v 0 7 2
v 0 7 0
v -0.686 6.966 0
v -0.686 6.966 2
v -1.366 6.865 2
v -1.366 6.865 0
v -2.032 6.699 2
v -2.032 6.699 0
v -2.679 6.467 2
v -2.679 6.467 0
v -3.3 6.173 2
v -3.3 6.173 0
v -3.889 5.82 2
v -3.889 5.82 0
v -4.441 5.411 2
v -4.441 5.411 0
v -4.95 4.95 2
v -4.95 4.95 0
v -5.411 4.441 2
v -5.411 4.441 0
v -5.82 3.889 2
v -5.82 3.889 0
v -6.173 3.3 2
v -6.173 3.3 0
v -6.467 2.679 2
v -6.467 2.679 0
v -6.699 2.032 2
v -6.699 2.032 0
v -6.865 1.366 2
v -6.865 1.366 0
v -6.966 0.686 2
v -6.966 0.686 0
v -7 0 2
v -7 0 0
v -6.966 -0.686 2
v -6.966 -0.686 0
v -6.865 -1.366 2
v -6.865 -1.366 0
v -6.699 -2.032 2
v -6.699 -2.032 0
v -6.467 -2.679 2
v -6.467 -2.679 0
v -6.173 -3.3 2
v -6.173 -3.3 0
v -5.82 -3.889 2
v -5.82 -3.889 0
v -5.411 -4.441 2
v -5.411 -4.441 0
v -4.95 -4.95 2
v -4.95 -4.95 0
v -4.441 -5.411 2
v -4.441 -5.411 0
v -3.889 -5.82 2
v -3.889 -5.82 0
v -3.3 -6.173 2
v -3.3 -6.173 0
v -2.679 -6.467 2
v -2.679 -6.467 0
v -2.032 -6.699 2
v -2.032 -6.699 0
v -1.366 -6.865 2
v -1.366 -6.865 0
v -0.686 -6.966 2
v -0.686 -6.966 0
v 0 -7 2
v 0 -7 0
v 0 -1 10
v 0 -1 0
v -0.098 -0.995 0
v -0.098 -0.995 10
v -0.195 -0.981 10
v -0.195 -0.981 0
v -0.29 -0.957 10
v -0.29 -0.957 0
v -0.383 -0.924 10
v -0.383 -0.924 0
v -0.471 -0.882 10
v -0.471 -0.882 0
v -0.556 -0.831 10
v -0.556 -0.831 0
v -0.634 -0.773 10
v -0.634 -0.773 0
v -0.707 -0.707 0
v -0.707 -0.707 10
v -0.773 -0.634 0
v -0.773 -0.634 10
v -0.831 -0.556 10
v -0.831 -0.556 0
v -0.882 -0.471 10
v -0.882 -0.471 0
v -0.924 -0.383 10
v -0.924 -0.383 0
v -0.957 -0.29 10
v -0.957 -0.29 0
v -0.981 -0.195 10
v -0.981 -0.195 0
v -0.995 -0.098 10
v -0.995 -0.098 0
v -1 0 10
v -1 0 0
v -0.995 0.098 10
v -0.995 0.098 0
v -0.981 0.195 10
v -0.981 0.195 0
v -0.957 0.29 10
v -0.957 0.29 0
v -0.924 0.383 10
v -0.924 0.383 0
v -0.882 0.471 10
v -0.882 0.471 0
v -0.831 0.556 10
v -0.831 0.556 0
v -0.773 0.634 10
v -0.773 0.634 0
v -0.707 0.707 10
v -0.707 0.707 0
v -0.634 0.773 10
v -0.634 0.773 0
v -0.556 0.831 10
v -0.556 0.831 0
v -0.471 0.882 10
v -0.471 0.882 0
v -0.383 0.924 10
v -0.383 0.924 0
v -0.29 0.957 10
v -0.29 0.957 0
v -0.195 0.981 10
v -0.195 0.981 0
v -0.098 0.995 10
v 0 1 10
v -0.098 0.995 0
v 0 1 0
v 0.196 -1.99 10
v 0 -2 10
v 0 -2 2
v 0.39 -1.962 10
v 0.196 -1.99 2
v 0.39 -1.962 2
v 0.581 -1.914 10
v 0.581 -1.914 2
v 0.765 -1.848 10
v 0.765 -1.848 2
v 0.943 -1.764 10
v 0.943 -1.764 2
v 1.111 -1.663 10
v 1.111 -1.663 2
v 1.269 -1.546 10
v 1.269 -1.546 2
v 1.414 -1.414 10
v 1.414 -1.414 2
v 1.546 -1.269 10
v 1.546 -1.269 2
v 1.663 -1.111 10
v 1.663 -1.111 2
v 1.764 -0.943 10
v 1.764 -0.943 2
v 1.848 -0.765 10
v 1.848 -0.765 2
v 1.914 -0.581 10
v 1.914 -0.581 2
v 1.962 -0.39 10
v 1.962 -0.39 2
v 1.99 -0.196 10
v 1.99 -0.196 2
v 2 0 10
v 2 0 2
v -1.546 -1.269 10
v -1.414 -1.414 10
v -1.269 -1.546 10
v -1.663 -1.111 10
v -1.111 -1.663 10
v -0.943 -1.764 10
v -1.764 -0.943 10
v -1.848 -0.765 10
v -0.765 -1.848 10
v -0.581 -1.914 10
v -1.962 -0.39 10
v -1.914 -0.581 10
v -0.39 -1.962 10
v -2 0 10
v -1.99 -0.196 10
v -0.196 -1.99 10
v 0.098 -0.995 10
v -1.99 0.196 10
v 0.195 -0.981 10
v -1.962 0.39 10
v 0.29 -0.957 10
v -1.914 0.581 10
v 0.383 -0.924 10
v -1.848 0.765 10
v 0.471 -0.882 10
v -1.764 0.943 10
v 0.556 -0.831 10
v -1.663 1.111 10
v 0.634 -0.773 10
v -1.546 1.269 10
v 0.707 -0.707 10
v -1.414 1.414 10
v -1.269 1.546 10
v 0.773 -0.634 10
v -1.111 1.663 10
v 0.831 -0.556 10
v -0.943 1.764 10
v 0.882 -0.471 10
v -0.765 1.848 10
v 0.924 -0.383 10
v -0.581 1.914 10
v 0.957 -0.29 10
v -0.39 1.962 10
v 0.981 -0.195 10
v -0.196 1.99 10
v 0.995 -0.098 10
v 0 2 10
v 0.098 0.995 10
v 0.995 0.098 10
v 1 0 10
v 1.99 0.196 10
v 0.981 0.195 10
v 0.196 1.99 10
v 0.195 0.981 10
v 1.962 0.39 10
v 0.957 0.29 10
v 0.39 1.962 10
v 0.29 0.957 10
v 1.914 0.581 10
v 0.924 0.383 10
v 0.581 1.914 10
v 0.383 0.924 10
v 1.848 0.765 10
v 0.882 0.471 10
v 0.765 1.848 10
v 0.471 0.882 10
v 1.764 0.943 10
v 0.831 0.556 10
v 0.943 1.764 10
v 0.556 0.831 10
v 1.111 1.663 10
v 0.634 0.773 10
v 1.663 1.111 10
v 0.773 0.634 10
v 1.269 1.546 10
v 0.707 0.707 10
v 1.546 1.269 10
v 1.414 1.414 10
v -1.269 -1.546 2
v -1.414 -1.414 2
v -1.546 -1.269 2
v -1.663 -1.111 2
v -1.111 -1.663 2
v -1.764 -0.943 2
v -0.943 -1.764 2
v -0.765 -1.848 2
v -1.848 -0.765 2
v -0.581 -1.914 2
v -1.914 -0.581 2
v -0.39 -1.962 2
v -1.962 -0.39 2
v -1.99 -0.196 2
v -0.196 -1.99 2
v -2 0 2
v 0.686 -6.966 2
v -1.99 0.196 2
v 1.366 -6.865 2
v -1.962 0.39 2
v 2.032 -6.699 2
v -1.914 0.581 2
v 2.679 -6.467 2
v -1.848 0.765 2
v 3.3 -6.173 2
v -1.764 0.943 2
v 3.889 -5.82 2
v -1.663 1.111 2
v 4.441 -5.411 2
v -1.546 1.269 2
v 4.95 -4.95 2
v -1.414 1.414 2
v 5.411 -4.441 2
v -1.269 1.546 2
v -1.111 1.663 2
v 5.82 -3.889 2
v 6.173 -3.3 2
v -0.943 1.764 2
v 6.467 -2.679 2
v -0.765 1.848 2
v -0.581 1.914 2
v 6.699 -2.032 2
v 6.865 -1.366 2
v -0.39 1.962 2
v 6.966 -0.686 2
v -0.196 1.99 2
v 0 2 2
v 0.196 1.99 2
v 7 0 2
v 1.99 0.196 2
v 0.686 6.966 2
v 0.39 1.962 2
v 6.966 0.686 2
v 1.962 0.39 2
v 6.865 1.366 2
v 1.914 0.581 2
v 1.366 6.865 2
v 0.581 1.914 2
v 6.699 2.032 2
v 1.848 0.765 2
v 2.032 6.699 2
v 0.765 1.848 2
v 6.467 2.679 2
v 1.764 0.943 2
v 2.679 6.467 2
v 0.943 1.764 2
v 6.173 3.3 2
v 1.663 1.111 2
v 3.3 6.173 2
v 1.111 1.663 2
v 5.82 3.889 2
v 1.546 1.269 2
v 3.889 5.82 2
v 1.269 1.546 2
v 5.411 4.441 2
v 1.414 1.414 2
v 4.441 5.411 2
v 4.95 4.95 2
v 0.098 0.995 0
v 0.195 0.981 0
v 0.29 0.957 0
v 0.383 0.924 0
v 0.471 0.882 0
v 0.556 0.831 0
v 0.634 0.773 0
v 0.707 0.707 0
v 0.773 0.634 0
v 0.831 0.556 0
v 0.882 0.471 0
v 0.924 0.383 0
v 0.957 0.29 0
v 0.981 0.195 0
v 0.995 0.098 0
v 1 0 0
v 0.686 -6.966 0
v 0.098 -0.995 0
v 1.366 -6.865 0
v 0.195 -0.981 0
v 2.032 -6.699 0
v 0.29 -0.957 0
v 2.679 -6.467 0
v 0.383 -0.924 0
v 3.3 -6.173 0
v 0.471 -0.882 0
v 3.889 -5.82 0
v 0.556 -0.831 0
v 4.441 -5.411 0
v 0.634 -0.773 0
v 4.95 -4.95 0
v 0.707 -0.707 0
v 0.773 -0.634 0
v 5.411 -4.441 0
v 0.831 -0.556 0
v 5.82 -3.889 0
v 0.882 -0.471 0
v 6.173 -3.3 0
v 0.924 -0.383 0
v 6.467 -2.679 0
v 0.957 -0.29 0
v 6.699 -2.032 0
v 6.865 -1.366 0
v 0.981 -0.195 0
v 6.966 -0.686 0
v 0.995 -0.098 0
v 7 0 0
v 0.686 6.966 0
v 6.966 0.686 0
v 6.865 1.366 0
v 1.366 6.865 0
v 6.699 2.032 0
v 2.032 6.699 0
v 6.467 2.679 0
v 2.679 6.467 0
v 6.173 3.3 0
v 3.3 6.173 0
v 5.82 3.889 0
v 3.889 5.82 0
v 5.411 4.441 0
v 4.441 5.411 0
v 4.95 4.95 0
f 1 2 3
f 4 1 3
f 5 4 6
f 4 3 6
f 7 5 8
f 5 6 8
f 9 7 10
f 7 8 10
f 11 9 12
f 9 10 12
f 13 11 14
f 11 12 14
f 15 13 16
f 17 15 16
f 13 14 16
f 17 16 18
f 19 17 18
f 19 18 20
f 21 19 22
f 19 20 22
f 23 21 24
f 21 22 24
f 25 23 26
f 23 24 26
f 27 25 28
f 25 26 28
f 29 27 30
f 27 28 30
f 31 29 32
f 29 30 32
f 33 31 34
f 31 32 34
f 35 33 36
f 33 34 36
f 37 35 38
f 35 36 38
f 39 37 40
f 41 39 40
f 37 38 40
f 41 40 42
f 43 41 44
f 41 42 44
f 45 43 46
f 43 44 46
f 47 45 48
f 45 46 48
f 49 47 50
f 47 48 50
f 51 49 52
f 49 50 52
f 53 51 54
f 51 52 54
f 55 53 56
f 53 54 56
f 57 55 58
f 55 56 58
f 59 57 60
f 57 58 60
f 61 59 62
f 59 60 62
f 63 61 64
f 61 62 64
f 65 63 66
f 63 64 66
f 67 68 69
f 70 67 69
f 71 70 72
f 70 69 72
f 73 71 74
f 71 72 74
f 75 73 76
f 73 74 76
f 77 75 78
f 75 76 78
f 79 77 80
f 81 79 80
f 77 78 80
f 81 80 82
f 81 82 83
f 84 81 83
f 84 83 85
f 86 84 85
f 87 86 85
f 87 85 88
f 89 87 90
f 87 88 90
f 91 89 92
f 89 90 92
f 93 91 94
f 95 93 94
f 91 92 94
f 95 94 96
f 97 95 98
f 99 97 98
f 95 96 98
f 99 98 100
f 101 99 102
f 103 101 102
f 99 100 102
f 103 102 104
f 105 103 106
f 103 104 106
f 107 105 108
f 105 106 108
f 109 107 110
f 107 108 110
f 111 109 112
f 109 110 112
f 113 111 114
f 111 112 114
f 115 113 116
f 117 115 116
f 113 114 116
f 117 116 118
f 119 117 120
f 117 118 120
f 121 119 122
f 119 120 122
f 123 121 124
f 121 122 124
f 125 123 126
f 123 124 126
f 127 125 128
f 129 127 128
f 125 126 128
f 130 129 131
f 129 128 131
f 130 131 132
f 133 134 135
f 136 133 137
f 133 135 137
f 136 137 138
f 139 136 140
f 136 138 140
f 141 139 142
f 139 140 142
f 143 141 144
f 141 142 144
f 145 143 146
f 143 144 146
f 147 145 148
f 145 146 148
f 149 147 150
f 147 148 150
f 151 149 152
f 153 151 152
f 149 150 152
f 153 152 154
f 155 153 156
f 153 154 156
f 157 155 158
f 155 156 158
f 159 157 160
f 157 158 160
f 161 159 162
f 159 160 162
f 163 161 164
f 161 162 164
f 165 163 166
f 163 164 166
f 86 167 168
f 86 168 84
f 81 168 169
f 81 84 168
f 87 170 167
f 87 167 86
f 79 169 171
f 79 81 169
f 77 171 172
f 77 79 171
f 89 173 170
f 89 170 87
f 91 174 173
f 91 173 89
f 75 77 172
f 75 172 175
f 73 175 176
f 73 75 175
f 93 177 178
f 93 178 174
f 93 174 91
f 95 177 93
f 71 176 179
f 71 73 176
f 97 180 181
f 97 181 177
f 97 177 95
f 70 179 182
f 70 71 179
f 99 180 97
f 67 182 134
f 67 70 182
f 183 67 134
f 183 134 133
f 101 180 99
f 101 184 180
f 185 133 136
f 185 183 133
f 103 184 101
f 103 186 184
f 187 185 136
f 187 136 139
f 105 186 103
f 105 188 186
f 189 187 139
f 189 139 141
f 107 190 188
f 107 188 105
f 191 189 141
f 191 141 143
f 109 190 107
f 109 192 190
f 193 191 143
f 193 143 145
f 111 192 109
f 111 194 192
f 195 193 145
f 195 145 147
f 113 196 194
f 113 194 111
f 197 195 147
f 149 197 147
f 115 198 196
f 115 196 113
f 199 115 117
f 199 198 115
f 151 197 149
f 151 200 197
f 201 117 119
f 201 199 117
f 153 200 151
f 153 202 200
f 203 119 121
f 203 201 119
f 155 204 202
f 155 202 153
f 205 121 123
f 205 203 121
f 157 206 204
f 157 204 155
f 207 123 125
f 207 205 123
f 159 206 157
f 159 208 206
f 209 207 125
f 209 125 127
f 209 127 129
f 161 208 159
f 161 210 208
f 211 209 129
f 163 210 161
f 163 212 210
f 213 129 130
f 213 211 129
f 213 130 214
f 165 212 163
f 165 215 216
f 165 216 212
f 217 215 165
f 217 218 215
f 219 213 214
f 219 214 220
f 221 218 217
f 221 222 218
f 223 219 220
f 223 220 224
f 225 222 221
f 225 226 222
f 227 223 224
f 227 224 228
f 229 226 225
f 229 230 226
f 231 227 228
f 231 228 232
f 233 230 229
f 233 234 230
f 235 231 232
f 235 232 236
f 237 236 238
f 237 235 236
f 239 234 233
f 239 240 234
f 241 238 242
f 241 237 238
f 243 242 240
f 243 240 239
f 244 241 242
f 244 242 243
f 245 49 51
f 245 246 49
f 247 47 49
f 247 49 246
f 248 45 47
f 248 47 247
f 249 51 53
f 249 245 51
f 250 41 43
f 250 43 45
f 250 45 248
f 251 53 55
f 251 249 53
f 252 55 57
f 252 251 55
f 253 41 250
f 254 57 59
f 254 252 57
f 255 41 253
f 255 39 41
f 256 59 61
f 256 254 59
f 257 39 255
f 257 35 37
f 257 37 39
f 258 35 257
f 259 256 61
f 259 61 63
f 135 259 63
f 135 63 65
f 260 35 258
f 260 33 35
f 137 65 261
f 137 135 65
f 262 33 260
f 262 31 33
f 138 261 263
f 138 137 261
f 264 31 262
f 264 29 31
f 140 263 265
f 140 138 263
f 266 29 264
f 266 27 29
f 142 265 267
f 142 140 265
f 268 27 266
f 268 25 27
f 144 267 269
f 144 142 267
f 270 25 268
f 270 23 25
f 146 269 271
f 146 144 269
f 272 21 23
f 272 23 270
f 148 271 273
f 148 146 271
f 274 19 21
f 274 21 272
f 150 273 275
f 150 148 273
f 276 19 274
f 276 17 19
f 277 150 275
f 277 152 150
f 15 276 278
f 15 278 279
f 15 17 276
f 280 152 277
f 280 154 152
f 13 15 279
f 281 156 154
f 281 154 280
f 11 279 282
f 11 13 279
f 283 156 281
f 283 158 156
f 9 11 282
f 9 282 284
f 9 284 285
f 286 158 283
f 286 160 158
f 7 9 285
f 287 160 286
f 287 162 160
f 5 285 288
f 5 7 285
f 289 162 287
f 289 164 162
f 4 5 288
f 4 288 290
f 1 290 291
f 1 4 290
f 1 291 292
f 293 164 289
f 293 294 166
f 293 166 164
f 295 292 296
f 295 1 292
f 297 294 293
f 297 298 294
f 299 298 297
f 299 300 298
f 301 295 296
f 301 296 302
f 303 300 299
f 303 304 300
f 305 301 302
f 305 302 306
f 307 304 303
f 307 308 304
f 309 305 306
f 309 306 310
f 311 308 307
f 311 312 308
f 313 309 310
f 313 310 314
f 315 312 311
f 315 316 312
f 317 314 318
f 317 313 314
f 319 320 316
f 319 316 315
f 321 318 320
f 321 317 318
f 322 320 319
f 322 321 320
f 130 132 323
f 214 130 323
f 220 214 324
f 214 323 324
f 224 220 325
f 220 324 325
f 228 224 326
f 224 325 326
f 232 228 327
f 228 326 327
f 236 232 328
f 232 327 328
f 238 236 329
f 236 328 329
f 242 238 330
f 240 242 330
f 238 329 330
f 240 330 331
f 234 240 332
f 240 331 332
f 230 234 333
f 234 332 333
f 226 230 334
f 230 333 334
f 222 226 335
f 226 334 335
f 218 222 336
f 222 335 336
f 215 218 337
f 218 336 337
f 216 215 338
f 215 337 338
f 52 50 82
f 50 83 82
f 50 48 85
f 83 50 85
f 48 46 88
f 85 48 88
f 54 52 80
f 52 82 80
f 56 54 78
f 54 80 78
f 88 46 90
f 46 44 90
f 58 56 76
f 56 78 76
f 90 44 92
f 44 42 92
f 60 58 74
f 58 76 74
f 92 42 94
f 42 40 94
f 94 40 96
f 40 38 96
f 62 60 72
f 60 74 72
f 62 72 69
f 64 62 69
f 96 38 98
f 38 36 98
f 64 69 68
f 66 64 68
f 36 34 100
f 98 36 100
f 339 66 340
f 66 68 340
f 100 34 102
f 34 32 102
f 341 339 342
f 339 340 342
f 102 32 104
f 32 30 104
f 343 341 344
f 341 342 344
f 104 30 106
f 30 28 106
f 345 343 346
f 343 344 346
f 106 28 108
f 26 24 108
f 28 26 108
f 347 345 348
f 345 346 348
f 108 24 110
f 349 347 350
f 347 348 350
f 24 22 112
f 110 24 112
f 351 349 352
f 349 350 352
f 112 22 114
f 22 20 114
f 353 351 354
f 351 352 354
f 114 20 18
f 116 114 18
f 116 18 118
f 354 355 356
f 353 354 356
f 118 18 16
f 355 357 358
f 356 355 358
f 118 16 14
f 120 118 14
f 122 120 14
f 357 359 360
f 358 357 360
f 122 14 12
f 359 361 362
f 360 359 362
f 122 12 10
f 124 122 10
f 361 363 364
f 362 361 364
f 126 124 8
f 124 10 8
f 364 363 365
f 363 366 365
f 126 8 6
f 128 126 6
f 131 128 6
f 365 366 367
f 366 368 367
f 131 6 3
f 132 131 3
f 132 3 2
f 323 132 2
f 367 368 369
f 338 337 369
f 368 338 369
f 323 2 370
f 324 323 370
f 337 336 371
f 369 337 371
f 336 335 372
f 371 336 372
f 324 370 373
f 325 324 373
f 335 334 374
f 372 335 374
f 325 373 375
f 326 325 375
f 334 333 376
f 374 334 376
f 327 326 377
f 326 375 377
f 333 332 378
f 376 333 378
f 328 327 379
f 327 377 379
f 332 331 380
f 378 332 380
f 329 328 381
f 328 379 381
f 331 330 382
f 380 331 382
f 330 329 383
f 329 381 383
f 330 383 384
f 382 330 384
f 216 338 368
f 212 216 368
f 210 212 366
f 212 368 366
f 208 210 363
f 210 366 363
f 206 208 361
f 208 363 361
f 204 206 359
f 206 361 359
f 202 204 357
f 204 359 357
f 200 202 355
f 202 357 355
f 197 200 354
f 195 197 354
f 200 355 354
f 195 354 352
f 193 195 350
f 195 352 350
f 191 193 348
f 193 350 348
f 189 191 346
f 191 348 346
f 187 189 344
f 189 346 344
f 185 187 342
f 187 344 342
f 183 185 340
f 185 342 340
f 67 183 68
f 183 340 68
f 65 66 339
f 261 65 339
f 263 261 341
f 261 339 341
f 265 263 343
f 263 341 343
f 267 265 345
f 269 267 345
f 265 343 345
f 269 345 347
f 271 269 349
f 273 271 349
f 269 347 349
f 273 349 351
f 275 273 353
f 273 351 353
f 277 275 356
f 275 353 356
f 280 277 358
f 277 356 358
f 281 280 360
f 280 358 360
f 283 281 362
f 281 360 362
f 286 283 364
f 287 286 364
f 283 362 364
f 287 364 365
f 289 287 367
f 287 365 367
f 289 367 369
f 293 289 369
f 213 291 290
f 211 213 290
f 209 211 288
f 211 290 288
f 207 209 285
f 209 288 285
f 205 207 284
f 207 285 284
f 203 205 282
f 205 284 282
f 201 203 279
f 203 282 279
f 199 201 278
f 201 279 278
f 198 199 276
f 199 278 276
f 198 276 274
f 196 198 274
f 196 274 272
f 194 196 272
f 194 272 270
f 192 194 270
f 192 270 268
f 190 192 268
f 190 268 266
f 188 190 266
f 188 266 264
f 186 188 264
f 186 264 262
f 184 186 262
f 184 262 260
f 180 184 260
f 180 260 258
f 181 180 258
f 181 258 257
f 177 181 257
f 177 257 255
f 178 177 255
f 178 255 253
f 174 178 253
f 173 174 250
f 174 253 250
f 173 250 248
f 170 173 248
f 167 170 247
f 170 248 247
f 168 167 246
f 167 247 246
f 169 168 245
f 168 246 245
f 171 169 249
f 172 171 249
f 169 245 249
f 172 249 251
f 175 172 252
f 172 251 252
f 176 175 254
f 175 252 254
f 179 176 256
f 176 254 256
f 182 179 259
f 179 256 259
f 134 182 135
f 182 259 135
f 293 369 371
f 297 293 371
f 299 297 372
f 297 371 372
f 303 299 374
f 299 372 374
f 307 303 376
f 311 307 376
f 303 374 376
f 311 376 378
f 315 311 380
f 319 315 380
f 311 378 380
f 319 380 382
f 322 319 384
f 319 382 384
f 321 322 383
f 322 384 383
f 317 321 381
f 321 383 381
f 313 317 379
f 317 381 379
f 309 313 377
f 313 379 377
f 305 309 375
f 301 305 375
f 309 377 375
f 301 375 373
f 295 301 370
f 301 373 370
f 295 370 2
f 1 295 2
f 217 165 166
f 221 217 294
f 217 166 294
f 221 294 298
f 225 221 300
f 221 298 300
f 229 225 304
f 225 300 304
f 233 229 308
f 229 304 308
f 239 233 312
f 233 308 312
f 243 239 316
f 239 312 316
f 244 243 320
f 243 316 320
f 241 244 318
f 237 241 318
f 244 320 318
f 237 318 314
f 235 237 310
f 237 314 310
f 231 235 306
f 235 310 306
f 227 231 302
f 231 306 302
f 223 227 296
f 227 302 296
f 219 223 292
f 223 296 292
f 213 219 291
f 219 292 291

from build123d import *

# Parameters (mm, degrees)
F1_DEPTH = 2
F2_DEPTH = 2
F3_DEPTH = 10


with BuildPart() as f1:
    # F0 (on Top) → F1 (new body)
    with BuildSketch(Plane.XY):
        with BuildLine():
            Line((0, 2), (0, 7))
            ThreePointArc((0, 7), (-7, 0), (0, -7))
            Line((0, -7), (0, -2))
            ThreePointArc((0, -2), (-2, 0), (0, 2))
        make_face()
    extrude(amount=F1_DEPTH)



with BuildPart() as f2:
    # F0 (on Top) → F2 (new body)
    with BuildSketch(Plane.XY):
        with BuildLine():
            ThreePointArc((0, -7), (4.949747, -4.949747), (7, 0))
            ThreePointArc((7, 0), (4.949747, 4.949747), (0, 7))
            Line((0, 7), (0, 2))
            ThreePointArc((0, 2), (1.414214, 1.414214), (2, 0))
            ThreePointArc((2, 0), (1.414214, -1.414214), (0, -2))
            Line((0, -2), (0, -7))
        make_face()
    extrude(amount=F2_DEPTH)


with BuildPart() as f1_1:
    add(f1.part)

    add(f2.part)  # F3 merges F2
    # F0 (on Top) → F3 (join)
    with BuildSketch(Plane.XY):
        with BuildLine():
            ThreePointArc((2, 0), (1.414214, 1.414214), (0, 2))
            Line((0, 2), (0, 1))
            ThreePointArc((0, 1), (0.707107, 0.707107), (1, 0))
            ThreePointArc((1, 0), (0.707107, -0.707107), (0, -1))
            Line((0, -1), (0, -2))
            ThreePointArc((0, -2), (1.414214, -1.414214), (2, 0))
        make_face()
        with BuildLine():
            Line((0, 1), (0, 2))
            ThreePointArc((0, 2), (-2, 0), (0, -2))
            Line((0, -2), (0, -1))
            ThreePointArc((0, -1), (-1, 0), (0, 1))
        make_face()
    extrude(amount=F3_DEPTH)


solid = f1_1.part
